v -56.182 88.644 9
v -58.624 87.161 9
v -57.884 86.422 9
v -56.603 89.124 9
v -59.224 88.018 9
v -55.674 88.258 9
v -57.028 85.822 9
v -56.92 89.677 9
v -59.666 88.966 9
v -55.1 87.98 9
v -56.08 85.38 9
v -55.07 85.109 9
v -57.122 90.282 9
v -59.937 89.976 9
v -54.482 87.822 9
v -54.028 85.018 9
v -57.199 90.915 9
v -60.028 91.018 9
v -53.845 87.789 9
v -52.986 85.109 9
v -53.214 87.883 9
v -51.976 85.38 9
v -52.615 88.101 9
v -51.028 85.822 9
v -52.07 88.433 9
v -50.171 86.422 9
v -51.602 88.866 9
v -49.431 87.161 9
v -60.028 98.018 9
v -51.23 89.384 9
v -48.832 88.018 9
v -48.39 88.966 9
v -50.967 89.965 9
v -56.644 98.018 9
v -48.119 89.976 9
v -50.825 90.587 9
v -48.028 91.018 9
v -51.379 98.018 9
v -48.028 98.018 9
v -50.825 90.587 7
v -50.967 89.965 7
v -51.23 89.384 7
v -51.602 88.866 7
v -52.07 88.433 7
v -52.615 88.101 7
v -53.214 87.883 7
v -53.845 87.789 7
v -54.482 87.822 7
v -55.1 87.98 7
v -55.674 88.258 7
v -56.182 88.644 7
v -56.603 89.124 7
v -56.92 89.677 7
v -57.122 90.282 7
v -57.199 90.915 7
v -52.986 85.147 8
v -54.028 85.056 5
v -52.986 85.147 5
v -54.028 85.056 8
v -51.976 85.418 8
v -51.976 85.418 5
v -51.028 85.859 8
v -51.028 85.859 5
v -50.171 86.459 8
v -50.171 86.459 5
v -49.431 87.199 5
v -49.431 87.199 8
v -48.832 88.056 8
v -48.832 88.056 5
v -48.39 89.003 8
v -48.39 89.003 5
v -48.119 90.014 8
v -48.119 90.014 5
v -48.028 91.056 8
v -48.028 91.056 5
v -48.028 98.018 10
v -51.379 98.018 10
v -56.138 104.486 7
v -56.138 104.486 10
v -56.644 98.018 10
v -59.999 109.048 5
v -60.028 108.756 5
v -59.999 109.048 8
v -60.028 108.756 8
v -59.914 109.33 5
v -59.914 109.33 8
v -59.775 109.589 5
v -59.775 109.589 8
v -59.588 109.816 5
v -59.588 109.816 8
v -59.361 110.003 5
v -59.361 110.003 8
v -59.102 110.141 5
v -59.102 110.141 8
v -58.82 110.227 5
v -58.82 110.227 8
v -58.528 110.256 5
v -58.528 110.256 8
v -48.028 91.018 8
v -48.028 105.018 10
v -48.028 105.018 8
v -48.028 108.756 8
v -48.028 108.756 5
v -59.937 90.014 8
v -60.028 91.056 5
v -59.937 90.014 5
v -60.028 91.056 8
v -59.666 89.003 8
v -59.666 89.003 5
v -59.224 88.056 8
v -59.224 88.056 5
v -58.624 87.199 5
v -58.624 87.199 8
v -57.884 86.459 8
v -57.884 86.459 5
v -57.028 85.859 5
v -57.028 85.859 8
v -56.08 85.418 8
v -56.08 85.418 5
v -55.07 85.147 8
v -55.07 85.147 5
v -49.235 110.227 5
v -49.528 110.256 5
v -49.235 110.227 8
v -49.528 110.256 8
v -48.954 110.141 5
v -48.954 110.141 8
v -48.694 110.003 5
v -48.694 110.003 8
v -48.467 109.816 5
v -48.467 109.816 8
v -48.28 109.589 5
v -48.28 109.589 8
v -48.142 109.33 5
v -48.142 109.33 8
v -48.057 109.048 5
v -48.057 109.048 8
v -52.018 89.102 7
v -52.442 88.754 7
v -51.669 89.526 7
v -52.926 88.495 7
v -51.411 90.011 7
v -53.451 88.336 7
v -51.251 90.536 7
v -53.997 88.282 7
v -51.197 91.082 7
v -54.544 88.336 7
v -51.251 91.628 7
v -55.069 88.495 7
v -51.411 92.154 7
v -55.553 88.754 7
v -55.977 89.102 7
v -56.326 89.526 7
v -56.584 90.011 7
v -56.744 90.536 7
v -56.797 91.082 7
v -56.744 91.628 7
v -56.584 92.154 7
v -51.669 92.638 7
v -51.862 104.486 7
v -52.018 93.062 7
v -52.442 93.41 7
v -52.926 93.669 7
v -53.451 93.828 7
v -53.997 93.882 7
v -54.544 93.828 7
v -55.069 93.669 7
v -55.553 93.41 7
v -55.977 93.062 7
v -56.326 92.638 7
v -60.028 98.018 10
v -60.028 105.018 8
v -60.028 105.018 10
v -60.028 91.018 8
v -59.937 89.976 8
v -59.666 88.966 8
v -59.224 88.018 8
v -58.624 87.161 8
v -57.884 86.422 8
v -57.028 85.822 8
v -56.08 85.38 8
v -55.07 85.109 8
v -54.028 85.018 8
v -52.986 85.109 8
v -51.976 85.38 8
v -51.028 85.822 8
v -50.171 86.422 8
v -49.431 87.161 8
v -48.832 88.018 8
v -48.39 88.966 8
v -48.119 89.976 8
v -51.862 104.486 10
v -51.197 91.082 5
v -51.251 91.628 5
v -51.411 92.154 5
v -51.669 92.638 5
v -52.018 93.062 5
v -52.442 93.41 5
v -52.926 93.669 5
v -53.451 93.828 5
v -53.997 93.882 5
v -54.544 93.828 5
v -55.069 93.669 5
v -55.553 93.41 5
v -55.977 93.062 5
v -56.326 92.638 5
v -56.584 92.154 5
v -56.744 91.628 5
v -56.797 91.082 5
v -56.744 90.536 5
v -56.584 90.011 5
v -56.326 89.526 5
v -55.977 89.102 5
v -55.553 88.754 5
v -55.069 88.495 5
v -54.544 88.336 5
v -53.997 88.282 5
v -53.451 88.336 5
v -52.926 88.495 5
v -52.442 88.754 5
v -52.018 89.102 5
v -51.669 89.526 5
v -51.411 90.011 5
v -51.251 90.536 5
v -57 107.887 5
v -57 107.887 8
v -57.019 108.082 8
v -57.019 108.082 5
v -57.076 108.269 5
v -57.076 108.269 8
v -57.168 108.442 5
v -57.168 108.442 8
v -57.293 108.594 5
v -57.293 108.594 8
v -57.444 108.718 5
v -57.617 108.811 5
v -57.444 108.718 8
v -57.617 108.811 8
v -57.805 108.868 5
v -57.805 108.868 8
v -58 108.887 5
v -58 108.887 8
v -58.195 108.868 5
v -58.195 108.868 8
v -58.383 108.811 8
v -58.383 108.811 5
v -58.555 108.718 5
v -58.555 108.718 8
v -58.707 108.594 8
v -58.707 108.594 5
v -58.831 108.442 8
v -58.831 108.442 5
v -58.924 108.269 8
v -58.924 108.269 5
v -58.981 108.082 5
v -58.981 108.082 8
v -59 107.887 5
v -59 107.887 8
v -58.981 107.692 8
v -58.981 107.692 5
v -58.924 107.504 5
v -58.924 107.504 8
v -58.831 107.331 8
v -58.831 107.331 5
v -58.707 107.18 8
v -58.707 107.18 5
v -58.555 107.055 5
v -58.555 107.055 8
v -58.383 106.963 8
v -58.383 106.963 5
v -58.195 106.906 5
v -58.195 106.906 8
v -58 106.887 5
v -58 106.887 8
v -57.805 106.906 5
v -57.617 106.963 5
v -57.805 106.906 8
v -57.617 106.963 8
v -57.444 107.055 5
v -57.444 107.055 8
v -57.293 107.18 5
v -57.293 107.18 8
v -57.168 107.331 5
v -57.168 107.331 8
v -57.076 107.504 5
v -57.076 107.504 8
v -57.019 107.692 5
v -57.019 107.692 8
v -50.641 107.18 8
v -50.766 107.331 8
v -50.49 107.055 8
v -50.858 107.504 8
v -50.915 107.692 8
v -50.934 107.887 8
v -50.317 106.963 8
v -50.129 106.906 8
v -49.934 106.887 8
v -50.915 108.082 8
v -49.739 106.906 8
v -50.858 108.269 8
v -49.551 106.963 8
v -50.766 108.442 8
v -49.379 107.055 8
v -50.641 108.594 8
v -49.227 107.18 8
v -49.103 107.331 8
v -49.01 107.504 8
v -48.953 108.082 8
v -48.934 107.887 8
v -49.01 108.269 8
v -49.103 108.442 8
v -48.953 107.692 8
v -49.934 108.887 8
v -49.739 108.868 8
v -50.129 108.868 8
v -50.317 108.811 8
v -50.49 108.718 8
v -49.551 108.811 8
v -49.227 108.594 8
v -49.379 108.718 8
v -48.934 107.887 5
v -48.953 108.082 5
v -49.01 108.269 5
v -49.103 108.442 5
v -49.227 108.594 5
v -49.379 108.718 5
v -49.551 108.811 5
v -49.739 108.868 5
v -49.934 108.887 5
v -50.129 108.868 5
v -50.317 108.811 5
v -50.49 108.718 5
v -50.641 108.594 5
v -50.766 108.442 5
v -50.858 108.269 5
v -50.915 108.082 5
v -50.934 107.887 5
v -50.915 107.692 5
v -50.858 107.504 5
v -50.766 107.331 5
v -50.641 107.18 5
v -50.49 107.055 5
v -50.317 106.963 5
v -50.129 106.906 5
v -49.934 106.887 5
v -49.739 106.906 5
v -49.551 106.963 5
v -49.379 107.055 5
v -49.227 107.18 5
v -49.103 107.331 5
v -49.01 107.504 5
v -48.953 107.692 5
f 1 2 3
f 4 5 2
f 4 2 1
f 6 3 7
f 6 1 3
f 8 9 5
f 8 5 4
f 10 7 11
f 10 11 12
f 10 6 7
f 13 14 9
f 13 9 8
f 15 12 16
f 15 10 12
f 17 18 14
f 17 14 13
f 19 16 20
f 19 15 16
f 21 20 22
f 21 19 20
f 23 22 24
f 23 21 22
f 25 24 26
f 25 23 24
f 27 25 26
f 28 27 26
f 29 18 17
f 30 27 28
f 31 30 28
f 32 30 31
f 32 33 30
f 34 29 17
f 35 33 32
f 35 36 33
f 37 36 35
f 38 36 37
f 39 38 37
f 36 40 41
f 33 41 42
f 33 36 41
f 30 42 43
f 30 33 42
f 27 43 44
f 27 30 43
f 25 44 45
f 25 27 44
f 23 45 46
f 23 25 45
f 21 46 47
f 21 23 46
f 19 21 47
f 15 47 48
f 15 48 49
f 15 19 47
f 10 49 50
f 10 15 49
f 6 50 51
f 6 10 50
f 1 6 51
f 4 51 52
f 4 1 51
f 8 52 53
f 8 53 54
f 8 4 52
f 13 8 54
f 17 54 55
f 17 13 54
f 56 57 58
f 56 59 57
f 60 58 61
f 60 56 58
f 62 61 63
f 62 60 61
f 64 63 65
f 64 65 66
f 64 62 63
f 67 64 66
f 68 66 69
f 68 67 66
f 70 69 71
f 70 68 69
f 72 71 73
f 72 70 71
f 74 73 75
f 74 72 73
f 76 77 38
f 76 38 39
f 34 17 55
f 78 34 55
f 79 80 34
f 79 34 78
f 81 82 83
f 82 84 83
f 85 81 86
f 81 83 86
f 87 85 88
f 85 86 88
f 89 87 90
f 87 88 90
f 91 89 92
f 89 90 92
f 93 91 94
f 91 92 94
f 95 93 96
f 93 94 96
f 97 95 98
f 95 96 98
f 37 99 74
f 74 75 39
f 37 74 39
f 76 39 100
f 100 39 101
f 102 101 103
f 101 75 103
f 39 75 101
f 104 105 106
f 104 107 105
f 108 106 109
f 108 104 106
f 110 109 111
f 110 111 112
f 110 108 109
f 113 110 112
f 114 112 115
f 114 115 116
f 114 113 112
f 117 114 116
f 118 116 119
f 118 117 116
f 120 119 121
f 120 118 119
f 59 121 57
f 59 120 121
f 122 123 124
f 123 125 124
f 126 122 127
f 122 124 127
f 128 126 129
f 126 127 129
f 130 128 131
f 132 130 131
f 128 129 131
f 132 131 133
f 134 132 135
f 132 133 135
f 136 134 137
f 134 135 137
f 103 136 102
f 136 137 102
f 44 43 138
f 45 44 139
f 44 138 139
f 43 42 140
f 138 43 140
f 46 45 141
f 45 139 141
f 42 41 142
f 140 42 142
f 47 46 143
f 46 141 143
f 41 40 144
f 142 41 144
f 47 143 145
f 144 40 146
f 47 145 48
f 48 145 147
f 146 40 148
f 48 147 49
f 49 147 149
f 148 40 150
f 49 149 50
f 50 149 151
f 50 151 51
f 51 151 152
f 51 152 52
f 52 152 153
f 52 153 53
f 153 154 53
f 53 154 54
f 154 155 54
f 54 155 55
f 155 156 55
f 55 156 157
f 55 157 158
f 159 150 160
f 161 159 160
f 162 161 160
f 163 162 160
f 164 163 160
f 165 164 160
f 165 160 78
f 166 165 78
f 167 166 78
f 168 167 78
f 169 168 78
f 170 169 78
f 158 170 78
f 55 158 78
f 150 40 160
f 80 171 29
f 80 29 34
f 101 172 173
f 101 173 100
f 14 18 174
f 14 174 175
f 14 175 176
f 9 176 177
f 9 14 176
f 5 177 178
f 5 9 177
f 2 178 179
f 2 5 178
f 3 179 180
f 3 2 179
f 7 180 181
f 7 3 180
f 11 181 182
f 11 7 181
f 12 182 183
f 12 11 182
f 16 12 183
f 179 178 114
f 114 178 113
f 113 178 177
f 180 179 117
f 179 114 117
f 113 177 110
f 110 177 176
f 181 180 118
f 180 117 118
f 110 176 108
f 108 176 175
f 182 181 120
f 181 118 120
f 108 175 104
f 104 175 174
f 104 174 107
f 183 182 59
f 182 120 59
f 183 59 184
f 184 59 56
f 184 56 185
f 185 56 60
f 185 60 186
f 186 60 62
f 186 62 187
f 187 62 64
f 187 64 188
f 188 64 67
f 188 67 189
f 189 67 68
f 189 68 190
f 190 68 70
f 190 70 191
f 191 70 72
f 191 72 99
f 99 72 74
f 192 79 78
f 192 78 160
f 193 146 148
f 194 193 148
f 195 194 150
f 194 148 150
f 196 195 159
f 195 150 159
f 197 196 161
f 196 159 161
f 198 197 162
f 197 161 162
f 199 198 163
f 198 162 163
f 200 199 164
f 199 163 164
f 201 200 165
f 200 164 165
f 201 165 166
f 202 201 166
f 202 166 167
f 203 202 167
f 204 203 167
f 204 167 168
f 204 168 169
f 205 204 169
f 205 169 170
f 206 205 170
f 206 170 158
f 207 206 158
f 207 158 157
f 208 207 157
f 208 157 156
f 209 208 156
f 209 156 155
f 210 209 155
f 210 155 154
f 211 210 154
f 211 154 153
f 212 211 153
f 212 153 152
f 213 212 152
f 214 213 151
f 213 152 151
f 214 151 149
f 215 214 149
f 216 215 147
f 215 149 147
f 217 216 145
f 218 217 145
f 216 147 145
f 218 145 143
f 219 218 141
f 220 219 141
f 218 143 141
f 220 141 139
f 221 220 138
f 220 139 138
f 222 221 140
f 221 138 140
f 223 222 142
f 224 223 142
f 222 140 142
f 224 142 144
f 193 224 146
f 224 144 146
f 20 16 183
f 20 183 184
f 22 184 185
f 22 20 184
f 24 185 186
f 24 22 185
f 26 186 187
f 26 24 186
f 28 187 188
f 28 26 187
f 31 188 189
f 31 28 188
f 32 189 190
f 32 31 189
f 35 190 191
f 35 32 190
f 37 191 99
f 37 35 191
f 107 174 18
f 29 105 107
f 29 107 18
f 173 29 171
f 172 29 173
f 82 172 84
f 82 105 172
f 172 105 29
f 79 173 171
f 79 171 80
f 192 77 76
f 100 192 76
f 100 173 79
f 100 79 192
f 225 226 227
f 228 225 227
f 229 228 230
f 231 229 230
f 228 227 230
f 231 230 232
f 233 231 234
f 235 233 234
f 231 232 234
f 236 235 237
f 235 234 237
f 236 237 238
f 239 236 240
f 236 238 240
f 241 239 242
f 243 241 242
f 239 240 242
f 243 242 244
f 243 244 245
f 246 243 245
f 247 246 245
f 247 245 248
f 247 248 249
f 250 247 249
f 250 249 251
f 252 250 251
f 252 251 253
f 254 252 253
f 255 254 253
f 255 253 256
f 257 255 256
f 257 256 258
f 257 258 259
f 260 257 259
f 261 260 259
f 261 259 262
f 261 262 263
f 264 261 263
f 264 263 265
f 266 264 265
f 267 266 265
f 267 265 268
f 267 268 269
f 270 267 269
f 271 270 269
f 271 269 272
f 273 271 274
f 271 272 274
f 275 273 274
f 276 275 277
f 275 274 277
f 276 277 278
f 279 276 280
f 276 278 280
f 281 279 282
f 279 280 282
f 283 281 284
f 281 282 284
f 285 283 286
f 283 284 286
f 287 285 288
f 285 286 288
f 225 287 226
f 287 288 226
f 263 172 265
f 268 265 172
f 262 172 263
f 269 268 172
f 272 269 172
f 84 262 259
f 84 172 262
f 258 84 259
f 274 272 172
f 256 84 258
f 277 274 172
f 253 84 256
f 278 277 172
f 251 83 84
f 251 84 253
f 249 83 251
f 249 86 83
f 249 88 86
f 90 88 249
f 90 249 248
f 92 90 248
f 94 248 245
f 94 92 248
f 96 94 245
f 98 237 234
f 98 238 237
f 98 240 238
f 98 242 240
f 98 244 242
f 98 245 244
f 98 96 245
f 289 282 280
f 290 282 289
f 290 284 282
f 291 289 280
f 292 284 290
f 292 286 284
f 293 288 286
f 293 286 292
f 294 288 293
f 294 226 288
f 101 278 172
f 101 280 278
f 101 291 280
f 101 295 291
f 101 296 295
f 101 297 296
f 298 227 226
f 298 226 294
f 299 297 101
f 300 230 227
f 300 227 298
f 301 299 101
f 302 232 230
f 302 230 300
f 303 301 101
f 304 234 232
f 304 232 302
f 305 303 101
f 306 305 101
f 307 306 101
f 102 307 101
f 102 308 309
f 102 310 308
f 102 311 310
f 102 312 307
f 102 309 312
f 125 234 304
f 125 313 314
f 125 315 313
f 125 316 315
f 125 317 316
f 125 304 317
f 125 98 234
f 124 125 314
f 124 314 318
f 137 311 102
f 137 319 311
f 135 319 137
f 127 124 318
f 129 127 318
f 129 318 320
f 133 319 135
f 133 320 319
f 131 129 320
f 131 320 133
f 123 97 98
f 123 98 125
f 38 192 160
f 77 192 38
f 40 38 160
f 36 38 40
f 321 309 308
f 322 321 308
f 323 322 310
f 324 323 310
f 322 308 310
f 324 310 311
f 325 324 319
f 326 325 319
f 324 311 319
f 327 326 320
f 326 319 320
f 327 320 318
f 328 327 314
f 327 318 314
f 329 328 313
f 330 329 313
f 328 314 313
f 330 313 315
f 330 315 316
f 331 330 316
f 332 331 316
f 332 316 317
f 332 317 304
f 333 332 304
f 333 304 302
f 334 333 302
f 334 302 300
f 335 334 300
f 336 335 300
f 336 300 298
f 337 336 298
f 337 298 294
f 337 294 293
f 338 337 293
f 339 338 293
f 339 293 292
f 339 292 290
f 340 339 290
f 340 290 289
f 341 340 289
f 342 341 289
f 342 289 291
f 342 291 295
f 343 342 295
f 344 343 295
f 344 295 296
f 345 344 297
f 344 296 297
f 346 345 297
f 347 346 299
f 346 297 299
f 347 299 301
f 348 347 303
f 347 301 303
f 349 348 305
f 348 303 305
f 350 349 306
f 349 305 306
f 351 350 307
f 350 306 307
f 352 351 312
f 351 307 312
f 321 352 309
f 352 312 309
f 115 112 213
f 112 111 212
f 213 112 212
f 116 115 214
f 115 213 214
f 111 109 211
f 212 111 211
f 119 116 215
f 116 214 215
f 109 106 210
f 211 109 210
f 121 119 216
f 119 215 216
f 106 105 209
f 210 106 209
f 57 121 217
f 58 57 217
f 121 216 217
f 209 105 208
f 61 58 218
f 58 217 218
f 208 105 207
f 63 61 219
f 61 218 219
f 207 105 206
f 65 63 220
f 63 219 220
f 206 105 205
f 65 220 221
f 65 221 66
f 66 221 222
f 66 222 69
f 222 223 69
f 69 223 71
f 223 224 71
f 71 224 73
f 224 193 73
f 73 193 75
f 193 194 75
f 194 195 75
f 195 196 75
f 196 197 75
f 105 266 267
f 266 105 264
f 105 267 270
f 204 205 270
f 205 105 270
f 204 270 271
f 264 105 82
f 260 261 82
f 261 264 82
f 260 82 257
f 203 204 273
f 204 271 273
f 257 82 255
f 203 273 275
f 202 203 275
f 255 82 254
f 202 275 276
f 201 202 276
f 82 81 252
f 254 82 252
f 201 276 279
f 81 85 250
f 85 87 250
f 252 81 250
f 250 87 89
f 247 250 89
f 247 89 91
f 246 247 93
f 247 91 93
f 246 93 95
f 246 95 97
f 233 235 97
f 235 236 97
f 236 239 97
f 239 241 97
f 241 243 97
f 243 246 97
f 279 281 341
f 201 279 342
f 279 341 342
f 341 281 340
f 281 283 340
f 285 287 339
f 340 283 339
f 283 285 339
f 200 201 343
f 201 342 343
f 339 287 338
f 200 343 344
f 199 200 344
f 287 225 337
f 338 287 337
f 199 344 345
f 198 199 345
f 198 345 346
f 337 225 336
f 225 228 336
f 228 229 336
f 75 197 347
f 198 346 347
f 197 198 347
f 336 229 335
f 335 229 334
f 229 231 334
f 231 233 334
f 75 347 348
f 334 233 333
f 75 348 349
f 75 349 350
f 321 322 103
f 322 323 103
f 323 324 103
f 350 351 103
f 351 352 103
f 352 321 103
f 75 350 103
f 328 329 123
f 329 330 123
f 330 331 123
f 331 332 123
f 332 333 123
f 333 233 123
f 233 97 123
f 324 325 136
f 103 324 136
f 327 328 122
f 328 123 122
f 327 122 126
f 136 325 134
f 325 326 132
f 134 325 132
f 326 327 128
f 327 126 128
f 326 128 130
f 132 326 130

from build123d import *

# Parameters (mm, degrees)
SKETCH1_W           = 12
SKETCH1_H           = 25.2
BOSS_EXTRUDE1_DEPTH = 3
FILLET1_R           = 6
SKETCH3_W           = 12
SKETCH3_H           = 20
BOSS_EXTRUDE2_DEPTH = 2
FILLET2_R           = 6
CUT_EXTRUDE1_DEPTH  = 3
SKETCH5_R           = 2.8
CUT_EXTRUDE2_DEPTH  = 126.573231257
SKETCH6_R           = 1
CUT_EXTRUDE3_DEPTH  = 126.573231257
SKETCH7_W           = 12.403914783
SKETCH7_H           = 13.383655683
CUT_EXTRUDE4_DEPTH  = 1
FILLET3_R           = 1.5


with BuildPart() as part:
    # Sketch1 → Boss-Extrude1 (new body)
    with BuildSketch(Plane.XY.offset(5)):
        with Locations((-54.027704131, 97.655662644)):
            Rectangle(SKETCH1_W, SKETCH1_H)
    extrude(amount=BOSS_EXTRUDE1_DEPTH)

    # Fillet1
    fillet1_edges = [part.edges().sort_by_distance(p)[0] for p in [
        (-48.027704131, 85.055662644, 6.5),
        (-60.027704131, 85.055662644, 6.5),
    ]]
    fillet(fillet1_edges, radius=FILLET1_R - 0.0001)  # a hair under: the kernel refuses the full size

    # Sketch3 → Boss-Extrude2 (add)
    with BuildSketch(Plane.XY.offset(8)):
        with Locations((-54.027704131, 95.017998247)):
            Rectangle(SKETCH3_W, SKETCH3_H)
    extrude(amount=BOSS_EXTRUDE2_DEPTH)

    # Fillet2
    fillet2_edges = [part.edges().sort_by_distance(p)[0] for p in [
        (-48.027704131, 85.017998247, 9),
        (-60.027704131, 85.017998247, 9),
    ]]
    fillet(fillet2_edges, radius=FILLET2_R - 0.0001)  # a hair under: the kernel refuses the full size

    # Sketch4 → Cut-Extrude1 (cut, symmetric)
    with BuildSketch(Plane.XY.offset(10)):
        with BuildLine():
            Line((-56.13842392, 104.48600769), (-51.86157608, 104.48600769))
            Line((-51.86157608, 104.48600769), (-50.824897766, 90.586959839))
            ThreePointArc((-50.824897766, 90.586959839), (-54.164460237, 87.789583498), (-57.199226379, 90.914993286))
            Line((-57.199226379, 90.914993286), (-56.13842392, 104.48600769))
        make_face()
    extrude(amount=CUT_EXTRUDE1_DEPTH, both=True, mode=Mode.SUBTRACT)

    # Sketch5 → Cut-Extrude2 (cut, through all)
    with BuildSketch(Plane.XY.offset(7)):
        with Locations((-53.997448325, 91.08203191)):
            Circle(SKETCH5_R)
    extrude(amount=-CUT_EXTRUDE2_DEPTH, mode=Mode.SUBTRACT)

    # Sketch6 → Cut-Extrude3 (cut, through all)
    with BuildSketch(Plane.XY.offset(8)):
        with Locations((-57.999885247, 107.886757068)):
            Circle(SKETCH6_R)
        with Locations((-49.934118523, 107.886757068)):
            Circle(SKETCH6_R)
    extrude(amount=-CUT_EXTRUDE3_DEPTH, mode=Mode.SUBTRACT)

    # Sketch7 → Cut-Extrude4 (cut)
    with BuildSketch(Plane.XY.offset(10)):
        with Locations((-53.82574674, 91.326170406)):
            Rectangle(SKETCH7_W, SKETCH7_H)
    extrude(amount=-CUT_EXTRUDE4_DEPTH, mode=Mode.SUBTRACT)

    # Fillet3
    fillet3_edges = [part.edges().sort_by_distance(p)[0] for p in [
        (-60.027704131, 110.255662644, 6.5),
        (-48.027704131, 110.255662644, 6.5),
    ]]
    fillet(fillet3_edges, radius=FILLET3_R)


solid = part.part
